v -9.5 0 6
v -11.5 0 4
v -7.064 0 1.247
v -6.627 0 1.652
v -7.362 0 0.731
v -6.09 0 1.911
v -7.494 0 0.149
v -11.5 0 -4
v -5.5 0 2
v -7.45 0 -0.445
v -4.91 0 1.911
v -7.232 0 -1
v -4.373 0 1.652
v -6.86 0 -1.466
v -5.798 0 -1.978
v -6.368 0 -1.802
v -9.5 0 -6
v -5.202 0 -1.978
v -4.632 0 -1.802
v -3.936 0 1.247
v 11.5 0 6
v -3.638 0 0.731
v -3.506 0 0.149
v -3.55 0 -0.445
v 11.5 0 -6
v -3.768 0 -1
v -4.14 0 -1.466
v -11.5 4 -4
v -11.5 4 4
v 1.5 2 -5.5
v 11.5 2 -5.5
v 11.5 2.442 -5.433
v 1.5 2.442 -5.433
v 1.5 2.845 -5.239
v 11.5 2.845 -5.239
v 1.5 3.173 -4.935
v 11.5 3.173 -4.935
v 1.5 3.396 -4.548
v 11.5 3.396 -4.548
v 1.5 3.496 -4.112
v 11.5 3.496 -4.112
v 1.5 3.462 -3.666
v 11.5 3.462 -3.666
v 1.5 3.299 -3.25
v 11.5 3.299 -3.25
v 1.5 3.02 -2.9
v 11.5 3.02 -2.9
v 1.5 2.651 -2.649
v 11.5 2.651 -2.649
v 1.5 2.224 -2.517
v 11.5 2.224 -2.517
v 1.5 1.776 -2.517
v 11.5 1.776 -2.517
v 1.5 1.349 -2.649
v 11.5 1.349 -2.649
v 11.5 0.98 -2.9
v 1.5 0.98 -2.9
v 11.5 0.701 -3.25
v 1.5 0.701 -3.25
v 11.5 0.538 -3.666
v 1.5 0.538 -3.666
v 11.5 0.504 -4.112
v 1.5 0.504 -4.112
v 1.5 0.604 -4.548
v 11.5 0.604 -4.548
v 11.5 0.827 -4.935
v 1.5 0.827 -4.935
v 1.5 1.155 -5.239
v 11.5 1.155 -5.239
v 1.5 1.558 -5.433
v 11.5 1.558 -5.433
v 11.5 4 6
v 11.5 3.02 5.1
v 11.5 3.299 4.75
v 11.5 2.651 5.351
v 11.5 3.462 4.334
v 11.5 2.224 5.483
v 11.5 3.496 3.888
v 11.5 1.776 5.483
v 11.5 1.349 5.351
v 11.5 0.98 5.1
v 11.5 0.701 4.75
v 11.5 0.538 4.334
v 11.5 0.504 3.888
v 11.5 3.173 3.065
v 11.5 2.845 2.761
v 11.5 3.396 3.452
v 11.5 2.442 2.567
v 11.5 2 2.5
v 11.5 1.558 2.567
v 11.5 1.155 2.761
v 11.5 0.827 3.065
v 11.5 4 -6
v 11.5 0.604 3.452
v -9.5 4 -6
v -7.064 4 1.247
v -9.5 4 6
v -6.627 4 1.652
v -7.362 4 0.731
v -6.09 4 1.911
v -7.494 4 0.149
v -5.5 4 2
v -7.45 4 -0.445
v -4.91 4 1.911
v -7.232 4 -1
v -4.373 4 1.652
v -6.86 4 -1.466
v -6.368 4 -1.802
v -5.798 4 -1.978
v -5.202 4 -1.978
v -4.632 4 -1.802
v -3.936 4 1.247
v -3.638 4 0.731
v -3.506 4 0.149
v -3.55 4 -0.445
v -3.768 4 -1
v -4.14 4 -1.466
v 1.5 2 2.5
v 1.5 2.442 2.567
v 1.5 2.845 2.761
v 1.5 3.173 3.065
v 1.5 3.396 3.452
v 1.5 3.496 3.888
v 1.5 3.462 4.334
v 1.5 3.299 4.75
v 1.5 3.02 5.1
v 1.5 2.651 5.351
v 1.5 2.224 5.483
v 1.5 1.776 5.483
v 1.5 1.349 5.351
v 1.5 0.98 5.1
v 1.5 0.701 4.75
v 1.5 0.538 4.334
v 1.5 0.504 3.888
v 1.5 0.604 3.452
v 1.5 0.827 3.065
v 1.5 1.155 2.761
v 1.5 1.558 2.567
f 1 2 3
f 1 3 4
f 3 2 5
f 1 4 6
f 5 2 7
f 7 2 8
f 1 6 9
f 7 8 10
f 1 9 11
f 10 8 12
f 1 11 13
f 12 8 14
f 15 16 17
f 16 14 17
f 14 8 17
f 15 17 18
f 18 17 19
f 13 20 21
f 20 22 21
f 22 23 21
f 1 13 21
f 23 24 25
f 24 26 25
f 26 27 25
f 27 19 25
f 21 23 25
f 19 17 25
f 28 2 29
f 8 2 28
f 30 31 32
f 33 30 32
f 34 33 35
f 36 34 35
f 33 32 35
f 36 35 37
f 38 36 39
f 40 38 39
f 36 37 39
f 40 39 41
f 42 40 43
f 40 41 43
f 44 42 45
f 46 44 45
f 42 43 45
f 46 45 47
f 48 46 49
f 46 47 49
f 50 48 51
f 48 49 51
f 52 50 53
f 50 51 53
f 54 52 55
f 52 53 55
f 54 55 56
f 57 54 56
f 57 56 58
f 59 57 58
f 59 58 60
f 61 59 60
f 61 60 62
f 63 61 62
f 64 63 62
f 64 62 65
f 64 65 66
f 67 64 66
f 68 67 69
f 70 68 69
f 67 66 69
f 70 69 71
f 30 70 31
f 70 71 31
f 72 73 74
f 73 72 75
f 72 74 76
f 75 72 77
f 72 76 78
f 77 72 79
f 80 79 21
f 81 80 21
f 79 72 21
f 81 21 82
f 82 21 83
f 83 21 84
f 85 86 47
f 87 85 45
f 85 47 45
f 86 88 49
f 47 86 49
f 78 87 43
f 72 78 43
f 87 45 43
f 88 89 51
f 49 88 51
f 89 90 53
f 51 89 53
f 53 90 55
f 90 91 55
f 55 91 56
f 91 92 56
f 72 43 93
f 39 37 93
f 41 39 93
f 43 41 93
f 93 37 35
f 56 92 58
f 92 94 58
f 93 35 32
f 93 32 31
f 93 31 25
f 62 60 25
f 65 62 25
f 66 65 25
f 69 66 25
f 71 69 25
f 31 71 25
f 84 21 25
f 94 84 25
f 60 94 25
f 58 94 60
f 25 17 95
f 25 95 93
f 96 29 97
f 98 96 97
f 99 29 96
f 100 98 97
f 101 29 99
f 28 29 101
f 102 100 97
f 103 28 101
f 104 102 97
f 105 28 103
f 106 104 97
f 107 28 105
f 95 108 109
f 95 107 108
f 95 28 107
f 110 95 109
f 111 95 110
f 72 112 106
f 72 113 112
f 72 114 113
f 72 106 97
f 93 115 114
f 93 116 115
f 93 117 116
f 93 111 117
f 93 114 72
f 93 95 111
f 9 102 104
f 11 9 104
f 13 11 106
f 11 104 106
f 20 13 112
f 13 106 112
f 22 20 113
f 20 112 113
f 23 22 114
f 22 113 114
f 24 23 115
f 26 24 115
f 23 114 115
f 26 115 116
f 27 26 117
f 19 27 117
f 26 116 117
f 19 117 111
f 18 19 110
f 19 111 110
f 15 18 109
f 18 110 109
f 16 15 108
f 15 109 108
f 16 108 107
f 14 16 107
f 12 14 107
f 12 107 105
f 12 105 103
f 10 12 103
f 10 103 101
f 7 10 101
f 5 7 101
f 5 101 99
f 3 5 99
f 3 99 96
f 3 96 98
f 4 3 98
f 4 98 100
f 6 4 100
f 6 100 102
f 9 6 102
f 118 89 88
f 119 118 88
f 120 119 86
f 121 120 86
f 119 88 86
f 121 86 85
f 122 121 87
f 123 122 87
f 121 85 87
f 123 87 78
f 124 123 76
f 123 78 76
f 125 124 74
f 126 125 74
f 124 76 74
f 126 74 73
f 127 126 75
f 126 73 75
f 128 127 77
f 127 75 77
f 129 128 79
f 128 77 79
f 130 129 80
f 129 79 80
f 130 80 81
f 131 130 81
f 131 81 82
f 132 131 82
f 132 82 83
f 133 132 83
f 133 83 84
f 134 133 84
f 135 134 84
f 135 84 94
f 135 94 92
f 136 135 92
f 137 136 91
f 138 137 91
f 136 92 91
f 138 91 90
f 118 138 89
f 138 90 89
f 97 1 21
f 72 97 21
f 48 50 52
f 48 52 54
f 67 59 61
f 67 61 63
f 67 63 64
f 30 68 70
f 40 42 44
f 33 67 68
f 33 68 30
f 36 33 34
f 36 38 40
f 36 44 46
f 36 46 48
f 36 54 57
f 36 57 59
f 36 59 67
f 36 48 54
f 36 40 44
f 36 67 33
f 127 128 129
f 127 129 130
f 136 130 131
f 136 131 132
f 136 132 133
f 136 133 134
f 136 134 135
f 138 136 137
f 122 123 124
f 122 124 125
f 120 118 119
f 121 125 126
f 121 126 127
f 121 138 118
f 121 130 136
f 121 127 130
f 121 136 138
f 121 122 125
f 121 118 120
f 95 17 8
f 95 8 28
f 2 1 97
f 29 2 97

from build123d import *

# Parameters (mm, degrees)
SKETCH1_W           = 23
SKETCH1_H           = 12
BOSS_EXTRUDE1_DEPTH = 4
SKETCH2_R           = 1.5
CUT_EXTRUDE1_DEPTH  = 10
SKETCH3_R           = 2
CUT_EXTRUDE2_DEPTH  = 14.57387196
CHAMFER1_SIZE       = 2


with BuildPart() as part:
    # Sketch1 → Boss-Extrude1 (new body)
    with BuildSketch(Plane(origin=(0, 0, 0), x_dir=(1, 0, 0), z_dir=(0, 1, 0))):
        Rectangle(SKETCH1_W, SKETCH1_H)
    extrude(amount=BOSS_EXTRUDE1_DEPTH)

    # Sketch2 → Cut-Extrude1 (cut)
    with BuildSketch(Plane(origin=(11.5, 0, 0), x_dir=(0, 0, -1), z_dir=(1, 0, 0))):
        with Locations((-4, 2)):
            Circle(SKETCH2_R)
        with Locations((4, 2)):
            Circle(SKETCH2_R)
    extrude(amount=-CUT_EXTRUDE1_DEPTH, mode=Mode.SUBTRACT)

    # Sketch3 → Cut-Extrude2 (cut, through all)
    with BuildSketch(Plane(origin=(0, 4, 0), x_dir=(1, 0, 0), z_dir=(0, 1, 0))):
        with Locations(Location((-5.5, 0, 0), (0, 0, 270))):
            Circle(SKETCH3_R)
    extrude(amount=-CUT_EXTRUDE2_DEPTH, mode=Mode.SUBTRACT)

    # Chamfer1
    chamfer1_edges = [part.edges().sort_by_distance(p)[0] for p in [
        (-11.5, 2, 6),
        (-11.5, 2, -6),
    ]]
    chamfer(chamfer1_edges, length=CHAMFER1_SIZE)


solid = part.part
